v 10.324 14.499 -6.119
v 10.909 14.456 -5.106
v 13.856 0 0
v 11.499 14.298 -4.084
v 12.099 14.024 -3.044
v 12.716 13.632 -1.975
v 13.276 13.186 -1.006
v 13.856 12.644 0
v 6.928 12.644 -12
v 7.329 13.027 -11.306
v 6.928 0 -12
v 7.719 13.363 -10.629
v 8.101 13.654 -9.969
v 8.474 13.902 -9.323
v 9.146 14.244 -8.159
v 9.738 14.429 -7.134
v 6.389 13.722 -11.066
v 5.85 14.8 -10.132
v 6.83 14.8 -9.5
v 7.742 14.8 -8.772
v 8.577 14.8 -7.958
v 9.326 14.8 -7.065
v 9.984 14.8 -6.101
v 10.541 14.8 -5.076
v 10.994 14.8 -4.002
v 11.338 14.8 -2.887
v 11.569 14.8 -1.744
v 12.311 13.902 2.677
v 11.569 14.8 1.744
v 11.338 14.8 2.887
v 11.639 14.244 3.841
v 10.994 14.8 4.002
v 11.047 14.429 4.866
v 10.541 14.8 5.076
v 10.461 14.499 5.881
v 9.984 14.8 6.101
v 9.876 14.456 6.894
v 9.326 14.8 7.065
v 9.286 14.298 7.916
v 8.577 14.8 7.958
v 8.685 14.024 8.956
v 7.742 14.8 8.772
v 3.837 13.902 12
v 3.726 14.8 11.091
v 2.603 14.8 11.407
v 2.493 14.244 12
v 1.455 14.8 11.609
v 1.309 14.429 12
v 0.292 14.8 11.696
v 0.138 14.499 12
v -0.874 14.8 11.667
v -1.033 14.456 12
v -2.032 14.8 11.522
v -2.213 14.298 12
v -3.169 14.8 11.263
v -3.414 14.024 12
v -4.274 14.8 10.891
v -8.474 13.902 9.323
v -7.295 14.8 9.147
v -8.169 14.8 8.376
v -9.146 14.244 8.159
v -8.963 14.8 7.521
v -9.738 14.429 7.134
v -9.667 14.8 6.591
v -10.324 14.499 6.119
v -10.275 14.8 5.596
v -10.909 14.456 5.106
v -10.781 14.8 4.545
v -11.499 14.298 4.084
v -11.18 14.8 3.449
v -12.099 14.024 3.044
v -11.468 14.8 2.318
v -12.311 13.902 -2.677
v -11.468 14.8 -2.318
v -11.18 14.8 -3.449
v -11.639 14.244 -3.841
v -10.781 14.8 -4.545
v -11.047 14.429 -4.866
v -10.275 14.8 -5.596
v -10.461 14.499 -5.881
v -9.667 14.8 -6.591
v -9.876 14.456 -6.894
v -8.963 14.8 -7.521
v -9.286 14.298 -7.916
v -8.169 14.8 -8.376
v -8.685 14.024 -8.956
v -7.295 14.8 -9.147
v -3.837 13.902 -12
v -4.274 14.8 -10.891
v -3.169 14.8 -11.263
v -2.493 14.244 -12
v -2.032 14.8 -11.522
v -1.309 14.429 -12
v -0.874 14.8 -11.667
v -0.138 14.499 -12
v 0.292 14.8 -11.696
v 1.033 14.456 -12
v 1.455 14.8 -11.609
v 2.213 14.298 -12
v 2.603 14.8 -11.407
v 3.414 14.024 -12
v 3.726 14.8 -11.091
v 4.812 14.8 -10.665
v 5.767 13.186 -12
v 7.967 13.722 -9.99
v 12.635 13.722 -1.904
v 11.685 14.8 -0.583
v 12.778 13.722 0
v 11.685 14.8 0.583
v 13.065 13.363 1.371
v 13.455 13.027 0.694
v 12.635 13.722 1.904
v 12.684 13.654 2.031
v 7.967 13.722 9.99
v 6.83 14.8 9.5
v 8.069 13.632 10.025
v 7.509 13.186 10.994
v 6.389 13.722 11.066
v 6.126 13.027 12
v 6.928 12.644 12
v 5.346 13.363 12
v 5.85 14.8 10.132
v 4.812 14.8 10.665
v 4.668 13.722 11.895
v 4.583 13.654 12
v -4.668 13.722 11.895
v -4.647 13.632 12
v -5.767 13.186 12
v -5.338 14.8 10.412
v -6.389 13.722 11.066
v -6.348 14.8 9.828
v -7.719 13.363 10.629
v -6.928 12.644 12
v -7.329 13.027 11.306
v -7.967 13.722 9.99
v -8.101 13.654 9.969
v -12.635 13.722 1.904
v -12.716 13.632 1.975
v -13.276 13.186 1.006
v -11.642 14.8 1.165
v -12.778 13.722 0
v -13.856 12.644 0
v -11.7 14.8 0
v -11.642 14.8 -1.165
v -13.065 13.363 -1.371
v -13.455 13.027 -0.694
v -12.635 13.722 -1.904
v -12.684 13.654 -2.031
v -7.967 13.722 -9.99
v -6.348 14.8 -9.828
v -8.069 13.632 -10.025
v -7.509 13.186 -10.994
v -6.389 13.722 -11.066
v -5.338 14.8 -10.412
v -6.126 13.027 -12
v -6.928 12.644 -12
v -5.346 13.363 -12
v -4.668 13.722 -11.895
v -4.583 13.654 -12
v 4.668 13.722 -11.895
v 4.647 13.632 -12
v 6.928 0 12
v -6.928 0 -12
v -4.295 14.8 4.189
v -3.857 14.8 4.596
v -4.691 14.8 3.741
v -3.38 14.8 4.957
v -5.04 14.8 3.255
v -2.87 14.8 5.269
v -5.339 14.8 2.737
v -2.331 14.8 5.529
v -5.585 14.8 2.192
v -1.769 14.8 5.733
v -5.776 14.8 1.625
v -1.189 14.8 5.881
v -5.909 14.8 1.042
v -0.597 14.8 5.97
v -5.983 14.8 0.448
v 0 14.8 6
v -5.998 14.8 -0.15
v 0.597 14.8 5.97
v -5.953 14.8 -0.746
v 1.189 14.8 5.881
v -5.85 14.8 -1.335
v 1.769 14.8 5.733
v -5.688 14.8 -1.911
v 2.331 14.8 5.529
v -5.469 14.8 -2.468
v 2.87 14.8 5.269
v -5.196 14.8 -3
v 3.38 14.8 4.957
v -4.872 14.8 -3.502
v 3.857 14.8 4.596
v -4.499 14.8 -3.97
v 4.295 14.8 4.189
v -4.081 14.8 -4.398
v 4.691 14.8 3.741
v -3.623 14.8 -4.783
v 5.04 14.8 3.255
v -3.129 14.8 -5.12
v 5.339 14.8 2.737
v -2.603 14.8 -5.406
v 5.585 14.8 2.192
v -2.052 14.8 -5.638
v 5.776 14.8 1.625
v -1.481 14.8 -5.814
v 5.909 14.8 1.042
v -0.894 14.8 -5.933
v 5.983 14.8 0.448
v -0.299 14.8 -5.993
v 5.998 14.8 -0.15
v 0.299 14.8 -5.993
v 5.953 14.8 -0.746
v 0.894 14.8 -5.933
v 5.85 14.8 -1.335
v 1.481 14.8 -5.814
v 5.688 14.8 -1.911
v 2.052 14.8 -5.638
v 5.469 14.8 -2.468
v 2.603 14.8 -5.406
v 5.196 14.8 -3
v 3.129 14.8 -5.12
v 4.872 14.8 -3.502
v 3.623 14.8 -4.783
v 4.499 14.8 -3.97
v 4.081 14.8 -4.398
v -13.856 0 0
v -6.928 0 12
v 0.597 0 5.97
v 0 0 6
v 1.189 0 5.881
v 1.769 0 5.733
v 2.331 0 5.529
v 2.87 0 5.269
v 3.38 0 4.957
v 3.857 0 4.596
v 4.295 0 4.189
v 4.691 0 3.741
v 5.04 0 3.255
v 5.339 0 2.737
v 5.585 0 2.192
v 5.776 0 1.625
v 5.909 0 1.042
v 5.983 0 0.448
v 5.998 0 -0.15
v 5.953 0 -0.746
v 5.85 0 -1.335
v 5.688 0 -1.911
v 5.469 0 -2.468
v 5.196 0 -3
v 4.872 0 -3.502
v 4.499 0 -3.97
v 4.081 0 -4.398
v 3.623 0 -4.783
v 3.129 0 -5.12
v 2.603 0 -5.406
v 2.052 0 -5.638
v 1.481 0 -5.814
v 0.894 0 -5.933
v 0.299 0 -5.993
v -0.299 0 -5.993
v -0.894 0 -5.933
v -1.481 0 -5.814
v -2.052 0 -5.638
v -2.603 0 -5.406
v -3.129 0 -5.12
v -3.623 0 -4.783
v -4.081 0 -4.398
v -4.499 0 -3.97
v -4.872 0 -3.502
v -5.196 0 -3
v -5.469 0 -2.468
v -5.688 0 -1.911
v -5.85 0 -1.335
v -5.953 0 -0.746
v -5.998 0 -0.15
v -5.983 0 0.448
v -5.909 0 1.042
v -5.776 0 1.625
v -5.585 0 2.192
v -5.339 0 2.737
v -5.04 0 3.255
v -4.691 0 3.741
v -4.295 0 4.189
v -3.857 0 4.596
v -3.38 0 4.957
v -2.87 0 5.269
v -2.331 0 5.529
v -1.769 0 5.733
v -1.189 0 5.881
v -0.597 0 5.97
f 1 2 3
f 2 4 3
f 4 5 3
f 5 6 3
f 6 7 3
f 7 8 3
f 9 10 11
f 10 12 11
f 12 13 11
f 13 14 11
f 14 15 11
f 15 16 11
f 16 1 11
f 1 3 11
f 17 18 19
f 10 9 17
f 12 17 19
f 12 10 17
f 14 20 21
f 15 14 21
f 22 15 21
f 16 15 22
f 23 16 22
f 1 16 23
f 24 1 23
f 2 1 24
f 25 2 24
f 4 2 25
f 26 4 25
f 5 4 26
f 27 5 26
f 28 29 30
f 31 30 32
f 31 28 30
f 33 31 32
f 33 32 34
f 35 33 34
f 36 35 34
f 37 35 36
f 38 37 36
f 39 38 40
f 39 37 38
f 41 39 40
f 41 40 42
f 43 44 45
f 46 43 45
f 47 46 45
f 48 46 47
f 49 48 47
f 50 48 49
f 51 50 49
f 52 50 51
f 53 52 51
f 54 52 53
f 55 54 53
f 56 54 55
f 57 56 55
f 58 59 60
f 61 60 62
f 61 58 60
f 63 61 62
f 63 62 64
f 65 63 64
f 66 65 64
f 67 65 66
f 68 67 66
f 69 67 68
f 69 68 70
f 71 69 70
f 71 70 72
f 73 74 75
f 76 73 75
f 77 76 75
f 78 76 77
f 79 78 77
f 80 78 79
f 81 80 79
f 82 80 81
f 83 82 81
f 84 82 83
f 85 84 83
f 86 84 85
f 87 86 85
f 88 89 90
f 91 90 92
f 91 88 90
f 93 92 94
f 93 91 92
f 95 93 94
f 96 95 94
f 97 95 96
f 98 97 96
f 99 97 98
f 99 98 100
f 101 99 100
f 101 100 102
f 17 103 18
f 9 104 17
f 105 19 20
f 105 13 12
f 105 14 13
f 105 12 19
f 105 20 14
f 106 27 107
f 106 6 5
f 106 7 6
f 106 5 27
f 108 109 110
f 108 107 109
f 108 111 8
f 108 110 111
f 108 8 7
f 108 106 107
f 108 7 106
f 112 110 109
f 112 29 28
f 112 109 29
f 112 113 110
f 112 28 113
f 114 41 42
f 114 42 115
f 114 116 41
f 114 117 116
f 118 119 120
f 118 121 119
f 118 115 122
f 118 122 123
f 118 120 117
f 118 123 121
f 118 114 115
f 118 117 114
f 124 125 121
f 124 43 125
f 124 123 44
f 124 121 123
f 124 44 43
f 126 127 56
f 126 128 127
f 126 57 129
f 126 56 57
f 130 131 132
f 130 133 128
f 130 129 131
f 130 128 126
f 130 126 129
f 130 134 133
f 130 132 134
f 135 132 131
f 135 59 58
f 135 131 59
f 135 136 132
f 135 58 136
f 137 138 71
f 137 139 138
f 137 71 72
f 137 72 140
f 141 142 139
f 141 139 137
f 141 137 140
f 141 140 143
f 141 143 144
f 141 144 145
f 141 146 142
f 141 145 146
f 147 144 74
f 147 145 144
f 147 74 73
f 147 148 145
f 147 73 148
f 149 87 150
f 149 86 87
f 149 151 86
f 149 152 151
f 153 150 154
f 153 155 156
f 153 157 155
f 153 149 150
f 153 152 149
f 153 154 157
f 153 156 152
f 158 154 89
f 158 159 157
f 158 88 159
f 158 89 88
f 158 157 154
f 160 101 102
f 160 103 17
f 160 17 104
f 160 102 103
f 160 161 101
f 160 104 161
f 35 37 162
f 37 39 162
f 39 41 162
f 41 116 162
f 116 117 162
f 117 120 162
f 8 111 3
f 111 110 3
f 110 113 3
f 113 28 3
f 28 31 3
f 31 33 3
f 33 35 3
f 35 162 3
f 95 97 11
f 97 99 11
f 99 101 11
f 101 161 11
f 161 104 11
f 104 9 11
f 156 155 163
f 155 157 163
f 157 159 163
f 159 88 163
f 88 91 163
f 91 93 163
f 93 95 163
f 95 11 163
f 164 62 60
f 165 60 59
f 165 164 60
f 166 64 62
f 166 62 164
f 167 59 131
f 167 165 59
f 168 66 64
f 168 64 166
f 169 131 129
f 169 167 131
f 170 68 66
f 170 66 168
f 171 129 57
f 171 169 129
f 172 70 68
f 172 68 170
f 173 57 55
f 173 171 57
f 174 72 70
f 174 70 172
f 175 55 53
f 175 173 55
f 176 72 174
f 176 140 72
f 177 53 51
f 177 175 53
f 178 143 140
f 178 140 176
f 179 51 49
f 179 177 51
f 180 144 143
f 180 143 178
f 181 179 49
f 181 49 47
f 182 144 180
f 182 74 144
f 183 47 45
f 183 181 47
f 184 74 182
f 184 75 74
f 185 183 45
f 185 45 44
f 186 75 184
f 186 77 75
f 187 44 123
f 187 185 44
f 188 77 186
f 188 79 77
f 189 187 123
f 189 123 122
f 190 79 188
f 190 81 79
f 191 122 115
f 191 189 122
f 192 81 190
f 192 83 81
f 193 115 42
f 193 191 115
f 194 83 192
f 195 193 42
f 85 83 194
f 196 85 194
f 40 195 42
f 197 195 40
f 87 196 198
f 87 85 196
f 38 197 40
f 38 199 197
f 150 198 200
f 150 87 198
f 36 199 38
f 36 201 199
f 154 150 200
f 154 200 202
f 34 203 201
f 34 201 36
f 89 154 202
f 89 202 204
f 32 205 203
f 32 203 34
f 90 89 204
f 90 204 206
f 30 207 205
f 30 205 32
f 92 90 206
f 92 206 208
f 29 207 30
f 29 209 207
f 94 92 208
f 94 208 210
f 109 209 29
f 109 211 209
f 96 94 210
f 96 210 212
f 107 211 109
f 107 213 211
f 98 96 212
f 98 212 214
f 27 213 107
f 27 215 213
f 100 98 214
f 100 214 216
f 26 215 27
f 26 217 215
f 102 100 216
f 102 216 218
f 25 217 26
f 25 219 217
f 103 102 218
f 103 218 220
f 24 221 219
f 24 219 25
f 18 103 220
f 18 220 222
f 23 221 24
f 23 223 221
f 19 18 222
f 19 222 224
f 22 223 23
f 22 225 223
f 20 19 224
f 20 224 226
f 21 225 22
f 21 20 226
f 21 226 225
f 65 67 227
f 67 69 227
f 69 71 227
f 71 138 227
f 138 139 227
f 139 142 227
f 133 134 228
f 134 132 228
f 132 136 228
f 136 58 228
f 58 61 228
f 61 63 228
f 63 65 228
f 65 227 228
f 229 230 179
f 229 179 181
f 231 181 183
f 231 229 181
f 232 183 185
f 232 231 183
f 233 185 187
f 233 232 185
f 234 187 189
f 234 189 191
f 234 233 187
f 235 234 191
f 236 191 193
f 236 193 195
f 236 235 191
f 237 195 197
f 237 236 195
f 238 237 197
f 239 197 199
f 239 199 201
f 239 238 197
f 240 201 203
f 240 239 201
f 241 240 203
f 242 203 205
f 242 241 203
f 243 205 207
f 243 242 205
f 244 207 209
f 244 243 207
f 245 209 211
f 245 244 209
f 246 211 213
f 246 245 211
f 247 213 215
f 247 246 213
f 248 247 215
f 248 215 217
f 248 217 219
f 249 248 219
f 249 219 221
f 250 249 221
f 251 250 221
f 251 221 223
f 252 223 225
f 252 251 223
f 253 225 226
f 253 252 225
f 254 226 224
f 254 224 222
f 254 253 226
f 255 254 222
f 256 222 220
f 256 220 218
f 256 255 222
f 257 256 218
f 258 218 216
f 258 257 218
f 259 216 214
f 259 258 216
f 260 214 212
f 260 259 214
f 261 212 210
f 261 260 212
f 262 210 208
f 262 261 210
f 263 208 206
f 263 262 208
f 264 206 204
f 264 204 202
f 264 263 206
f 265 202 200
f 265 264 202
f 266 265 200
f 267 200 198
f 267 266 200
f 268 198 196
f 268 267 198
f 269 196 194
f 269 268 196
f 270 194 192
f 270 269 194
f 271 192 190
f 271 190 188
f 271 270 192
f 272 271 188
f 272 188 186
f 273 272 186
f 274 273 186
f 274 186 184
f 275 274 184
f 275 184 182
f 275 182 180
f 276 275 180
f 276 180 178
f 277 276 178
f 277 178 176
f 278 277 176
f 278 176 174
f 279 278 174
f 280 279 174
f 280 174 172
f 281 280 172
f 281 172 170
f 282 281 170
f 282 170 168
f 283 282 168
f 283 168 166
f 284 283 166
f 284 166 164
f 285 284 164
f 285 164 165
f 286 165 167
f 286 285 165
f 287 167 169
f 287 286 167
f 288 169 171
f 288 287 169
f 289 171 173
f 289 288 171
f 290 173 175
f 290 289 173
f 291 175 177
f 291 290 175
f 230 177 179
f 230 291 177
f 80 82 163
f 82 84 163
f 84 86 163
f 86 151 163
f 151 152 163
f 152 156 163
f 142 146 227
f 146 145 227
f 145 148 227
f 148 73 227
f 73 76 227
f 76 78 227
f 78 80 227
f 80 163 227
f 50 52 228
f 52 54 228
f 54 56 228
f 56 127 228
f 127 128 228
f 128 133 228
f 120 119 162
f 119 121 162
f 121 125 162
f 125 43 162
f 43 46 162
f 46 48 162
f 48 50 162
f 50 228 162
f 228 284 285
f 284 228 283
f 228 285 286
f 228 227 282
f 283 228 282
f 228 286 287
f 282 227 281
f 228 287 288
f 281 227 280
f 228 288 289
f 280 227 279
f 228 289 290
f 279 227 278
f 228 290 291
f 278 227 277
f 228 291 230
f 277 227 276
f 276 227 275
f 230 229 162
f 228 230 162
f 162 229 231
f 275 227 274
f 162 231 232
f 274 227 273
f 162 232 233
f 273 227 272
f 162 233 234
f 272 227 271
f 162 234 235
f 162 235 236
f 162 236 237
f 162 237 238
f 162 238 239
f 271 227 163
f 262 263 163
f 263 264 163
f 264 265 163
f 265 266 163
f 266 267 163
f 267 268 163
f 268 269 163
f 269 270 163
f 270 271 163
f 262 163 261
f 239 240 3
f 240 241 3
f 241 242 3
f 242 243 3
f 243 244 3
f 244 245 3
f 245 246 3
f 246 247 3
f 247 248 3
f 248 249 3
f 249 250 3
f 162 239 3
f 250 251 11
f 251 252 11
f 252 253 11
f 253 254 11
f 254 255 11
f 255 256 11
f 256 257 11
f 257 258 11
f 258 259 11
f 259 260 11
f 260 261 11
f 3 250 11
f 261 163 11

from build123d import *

# Parameters (mm, degrees)
SKETCH_1_R      = 6
EXTRUDE_1_DEPTH = 14.8


with BuildPart() as part:
    # 草图1 → 凸台-拉伸1 (new body)
    with BuildSketch(Plane(origin=(0, 0, 0), x_dir=(1, 0, 0), z_dir=(0, 1, 0))):
        Polygon((-6.92820323, 12), (-13.856406461, 0), (-6.92820323, -12), (6.92820323, -12), (13.856406461, 0), (6.92820323, 12), align=None)
        with Locations(Location((0, 0, 0), (0, 0, 270))):
            Circle(SKETCH_1_R, mode=Mode.SUBTRACT)
    extrude(amount=EXTRUDE_1_DEPTH)

    # 草图2 → 切除-旋转1 (revolve, cut)
    with BuildSketch(Plane.XY, mode=Mode.PRIVATE) as cut_revolve_1_sk:
        Polygon((9.5, 17), (15, 11.5), (15, 17), align=None)
    revolve(cut_revolve_1_sk.sketch.rotate(Axis((0, 17.647957279, 0), (0, -1, 0)), 300.00000004), axis=Axis((0, 17.647957279, 0), (0, -1, 0)), mode=Mode.SUBTRACT)


solid = part.part
